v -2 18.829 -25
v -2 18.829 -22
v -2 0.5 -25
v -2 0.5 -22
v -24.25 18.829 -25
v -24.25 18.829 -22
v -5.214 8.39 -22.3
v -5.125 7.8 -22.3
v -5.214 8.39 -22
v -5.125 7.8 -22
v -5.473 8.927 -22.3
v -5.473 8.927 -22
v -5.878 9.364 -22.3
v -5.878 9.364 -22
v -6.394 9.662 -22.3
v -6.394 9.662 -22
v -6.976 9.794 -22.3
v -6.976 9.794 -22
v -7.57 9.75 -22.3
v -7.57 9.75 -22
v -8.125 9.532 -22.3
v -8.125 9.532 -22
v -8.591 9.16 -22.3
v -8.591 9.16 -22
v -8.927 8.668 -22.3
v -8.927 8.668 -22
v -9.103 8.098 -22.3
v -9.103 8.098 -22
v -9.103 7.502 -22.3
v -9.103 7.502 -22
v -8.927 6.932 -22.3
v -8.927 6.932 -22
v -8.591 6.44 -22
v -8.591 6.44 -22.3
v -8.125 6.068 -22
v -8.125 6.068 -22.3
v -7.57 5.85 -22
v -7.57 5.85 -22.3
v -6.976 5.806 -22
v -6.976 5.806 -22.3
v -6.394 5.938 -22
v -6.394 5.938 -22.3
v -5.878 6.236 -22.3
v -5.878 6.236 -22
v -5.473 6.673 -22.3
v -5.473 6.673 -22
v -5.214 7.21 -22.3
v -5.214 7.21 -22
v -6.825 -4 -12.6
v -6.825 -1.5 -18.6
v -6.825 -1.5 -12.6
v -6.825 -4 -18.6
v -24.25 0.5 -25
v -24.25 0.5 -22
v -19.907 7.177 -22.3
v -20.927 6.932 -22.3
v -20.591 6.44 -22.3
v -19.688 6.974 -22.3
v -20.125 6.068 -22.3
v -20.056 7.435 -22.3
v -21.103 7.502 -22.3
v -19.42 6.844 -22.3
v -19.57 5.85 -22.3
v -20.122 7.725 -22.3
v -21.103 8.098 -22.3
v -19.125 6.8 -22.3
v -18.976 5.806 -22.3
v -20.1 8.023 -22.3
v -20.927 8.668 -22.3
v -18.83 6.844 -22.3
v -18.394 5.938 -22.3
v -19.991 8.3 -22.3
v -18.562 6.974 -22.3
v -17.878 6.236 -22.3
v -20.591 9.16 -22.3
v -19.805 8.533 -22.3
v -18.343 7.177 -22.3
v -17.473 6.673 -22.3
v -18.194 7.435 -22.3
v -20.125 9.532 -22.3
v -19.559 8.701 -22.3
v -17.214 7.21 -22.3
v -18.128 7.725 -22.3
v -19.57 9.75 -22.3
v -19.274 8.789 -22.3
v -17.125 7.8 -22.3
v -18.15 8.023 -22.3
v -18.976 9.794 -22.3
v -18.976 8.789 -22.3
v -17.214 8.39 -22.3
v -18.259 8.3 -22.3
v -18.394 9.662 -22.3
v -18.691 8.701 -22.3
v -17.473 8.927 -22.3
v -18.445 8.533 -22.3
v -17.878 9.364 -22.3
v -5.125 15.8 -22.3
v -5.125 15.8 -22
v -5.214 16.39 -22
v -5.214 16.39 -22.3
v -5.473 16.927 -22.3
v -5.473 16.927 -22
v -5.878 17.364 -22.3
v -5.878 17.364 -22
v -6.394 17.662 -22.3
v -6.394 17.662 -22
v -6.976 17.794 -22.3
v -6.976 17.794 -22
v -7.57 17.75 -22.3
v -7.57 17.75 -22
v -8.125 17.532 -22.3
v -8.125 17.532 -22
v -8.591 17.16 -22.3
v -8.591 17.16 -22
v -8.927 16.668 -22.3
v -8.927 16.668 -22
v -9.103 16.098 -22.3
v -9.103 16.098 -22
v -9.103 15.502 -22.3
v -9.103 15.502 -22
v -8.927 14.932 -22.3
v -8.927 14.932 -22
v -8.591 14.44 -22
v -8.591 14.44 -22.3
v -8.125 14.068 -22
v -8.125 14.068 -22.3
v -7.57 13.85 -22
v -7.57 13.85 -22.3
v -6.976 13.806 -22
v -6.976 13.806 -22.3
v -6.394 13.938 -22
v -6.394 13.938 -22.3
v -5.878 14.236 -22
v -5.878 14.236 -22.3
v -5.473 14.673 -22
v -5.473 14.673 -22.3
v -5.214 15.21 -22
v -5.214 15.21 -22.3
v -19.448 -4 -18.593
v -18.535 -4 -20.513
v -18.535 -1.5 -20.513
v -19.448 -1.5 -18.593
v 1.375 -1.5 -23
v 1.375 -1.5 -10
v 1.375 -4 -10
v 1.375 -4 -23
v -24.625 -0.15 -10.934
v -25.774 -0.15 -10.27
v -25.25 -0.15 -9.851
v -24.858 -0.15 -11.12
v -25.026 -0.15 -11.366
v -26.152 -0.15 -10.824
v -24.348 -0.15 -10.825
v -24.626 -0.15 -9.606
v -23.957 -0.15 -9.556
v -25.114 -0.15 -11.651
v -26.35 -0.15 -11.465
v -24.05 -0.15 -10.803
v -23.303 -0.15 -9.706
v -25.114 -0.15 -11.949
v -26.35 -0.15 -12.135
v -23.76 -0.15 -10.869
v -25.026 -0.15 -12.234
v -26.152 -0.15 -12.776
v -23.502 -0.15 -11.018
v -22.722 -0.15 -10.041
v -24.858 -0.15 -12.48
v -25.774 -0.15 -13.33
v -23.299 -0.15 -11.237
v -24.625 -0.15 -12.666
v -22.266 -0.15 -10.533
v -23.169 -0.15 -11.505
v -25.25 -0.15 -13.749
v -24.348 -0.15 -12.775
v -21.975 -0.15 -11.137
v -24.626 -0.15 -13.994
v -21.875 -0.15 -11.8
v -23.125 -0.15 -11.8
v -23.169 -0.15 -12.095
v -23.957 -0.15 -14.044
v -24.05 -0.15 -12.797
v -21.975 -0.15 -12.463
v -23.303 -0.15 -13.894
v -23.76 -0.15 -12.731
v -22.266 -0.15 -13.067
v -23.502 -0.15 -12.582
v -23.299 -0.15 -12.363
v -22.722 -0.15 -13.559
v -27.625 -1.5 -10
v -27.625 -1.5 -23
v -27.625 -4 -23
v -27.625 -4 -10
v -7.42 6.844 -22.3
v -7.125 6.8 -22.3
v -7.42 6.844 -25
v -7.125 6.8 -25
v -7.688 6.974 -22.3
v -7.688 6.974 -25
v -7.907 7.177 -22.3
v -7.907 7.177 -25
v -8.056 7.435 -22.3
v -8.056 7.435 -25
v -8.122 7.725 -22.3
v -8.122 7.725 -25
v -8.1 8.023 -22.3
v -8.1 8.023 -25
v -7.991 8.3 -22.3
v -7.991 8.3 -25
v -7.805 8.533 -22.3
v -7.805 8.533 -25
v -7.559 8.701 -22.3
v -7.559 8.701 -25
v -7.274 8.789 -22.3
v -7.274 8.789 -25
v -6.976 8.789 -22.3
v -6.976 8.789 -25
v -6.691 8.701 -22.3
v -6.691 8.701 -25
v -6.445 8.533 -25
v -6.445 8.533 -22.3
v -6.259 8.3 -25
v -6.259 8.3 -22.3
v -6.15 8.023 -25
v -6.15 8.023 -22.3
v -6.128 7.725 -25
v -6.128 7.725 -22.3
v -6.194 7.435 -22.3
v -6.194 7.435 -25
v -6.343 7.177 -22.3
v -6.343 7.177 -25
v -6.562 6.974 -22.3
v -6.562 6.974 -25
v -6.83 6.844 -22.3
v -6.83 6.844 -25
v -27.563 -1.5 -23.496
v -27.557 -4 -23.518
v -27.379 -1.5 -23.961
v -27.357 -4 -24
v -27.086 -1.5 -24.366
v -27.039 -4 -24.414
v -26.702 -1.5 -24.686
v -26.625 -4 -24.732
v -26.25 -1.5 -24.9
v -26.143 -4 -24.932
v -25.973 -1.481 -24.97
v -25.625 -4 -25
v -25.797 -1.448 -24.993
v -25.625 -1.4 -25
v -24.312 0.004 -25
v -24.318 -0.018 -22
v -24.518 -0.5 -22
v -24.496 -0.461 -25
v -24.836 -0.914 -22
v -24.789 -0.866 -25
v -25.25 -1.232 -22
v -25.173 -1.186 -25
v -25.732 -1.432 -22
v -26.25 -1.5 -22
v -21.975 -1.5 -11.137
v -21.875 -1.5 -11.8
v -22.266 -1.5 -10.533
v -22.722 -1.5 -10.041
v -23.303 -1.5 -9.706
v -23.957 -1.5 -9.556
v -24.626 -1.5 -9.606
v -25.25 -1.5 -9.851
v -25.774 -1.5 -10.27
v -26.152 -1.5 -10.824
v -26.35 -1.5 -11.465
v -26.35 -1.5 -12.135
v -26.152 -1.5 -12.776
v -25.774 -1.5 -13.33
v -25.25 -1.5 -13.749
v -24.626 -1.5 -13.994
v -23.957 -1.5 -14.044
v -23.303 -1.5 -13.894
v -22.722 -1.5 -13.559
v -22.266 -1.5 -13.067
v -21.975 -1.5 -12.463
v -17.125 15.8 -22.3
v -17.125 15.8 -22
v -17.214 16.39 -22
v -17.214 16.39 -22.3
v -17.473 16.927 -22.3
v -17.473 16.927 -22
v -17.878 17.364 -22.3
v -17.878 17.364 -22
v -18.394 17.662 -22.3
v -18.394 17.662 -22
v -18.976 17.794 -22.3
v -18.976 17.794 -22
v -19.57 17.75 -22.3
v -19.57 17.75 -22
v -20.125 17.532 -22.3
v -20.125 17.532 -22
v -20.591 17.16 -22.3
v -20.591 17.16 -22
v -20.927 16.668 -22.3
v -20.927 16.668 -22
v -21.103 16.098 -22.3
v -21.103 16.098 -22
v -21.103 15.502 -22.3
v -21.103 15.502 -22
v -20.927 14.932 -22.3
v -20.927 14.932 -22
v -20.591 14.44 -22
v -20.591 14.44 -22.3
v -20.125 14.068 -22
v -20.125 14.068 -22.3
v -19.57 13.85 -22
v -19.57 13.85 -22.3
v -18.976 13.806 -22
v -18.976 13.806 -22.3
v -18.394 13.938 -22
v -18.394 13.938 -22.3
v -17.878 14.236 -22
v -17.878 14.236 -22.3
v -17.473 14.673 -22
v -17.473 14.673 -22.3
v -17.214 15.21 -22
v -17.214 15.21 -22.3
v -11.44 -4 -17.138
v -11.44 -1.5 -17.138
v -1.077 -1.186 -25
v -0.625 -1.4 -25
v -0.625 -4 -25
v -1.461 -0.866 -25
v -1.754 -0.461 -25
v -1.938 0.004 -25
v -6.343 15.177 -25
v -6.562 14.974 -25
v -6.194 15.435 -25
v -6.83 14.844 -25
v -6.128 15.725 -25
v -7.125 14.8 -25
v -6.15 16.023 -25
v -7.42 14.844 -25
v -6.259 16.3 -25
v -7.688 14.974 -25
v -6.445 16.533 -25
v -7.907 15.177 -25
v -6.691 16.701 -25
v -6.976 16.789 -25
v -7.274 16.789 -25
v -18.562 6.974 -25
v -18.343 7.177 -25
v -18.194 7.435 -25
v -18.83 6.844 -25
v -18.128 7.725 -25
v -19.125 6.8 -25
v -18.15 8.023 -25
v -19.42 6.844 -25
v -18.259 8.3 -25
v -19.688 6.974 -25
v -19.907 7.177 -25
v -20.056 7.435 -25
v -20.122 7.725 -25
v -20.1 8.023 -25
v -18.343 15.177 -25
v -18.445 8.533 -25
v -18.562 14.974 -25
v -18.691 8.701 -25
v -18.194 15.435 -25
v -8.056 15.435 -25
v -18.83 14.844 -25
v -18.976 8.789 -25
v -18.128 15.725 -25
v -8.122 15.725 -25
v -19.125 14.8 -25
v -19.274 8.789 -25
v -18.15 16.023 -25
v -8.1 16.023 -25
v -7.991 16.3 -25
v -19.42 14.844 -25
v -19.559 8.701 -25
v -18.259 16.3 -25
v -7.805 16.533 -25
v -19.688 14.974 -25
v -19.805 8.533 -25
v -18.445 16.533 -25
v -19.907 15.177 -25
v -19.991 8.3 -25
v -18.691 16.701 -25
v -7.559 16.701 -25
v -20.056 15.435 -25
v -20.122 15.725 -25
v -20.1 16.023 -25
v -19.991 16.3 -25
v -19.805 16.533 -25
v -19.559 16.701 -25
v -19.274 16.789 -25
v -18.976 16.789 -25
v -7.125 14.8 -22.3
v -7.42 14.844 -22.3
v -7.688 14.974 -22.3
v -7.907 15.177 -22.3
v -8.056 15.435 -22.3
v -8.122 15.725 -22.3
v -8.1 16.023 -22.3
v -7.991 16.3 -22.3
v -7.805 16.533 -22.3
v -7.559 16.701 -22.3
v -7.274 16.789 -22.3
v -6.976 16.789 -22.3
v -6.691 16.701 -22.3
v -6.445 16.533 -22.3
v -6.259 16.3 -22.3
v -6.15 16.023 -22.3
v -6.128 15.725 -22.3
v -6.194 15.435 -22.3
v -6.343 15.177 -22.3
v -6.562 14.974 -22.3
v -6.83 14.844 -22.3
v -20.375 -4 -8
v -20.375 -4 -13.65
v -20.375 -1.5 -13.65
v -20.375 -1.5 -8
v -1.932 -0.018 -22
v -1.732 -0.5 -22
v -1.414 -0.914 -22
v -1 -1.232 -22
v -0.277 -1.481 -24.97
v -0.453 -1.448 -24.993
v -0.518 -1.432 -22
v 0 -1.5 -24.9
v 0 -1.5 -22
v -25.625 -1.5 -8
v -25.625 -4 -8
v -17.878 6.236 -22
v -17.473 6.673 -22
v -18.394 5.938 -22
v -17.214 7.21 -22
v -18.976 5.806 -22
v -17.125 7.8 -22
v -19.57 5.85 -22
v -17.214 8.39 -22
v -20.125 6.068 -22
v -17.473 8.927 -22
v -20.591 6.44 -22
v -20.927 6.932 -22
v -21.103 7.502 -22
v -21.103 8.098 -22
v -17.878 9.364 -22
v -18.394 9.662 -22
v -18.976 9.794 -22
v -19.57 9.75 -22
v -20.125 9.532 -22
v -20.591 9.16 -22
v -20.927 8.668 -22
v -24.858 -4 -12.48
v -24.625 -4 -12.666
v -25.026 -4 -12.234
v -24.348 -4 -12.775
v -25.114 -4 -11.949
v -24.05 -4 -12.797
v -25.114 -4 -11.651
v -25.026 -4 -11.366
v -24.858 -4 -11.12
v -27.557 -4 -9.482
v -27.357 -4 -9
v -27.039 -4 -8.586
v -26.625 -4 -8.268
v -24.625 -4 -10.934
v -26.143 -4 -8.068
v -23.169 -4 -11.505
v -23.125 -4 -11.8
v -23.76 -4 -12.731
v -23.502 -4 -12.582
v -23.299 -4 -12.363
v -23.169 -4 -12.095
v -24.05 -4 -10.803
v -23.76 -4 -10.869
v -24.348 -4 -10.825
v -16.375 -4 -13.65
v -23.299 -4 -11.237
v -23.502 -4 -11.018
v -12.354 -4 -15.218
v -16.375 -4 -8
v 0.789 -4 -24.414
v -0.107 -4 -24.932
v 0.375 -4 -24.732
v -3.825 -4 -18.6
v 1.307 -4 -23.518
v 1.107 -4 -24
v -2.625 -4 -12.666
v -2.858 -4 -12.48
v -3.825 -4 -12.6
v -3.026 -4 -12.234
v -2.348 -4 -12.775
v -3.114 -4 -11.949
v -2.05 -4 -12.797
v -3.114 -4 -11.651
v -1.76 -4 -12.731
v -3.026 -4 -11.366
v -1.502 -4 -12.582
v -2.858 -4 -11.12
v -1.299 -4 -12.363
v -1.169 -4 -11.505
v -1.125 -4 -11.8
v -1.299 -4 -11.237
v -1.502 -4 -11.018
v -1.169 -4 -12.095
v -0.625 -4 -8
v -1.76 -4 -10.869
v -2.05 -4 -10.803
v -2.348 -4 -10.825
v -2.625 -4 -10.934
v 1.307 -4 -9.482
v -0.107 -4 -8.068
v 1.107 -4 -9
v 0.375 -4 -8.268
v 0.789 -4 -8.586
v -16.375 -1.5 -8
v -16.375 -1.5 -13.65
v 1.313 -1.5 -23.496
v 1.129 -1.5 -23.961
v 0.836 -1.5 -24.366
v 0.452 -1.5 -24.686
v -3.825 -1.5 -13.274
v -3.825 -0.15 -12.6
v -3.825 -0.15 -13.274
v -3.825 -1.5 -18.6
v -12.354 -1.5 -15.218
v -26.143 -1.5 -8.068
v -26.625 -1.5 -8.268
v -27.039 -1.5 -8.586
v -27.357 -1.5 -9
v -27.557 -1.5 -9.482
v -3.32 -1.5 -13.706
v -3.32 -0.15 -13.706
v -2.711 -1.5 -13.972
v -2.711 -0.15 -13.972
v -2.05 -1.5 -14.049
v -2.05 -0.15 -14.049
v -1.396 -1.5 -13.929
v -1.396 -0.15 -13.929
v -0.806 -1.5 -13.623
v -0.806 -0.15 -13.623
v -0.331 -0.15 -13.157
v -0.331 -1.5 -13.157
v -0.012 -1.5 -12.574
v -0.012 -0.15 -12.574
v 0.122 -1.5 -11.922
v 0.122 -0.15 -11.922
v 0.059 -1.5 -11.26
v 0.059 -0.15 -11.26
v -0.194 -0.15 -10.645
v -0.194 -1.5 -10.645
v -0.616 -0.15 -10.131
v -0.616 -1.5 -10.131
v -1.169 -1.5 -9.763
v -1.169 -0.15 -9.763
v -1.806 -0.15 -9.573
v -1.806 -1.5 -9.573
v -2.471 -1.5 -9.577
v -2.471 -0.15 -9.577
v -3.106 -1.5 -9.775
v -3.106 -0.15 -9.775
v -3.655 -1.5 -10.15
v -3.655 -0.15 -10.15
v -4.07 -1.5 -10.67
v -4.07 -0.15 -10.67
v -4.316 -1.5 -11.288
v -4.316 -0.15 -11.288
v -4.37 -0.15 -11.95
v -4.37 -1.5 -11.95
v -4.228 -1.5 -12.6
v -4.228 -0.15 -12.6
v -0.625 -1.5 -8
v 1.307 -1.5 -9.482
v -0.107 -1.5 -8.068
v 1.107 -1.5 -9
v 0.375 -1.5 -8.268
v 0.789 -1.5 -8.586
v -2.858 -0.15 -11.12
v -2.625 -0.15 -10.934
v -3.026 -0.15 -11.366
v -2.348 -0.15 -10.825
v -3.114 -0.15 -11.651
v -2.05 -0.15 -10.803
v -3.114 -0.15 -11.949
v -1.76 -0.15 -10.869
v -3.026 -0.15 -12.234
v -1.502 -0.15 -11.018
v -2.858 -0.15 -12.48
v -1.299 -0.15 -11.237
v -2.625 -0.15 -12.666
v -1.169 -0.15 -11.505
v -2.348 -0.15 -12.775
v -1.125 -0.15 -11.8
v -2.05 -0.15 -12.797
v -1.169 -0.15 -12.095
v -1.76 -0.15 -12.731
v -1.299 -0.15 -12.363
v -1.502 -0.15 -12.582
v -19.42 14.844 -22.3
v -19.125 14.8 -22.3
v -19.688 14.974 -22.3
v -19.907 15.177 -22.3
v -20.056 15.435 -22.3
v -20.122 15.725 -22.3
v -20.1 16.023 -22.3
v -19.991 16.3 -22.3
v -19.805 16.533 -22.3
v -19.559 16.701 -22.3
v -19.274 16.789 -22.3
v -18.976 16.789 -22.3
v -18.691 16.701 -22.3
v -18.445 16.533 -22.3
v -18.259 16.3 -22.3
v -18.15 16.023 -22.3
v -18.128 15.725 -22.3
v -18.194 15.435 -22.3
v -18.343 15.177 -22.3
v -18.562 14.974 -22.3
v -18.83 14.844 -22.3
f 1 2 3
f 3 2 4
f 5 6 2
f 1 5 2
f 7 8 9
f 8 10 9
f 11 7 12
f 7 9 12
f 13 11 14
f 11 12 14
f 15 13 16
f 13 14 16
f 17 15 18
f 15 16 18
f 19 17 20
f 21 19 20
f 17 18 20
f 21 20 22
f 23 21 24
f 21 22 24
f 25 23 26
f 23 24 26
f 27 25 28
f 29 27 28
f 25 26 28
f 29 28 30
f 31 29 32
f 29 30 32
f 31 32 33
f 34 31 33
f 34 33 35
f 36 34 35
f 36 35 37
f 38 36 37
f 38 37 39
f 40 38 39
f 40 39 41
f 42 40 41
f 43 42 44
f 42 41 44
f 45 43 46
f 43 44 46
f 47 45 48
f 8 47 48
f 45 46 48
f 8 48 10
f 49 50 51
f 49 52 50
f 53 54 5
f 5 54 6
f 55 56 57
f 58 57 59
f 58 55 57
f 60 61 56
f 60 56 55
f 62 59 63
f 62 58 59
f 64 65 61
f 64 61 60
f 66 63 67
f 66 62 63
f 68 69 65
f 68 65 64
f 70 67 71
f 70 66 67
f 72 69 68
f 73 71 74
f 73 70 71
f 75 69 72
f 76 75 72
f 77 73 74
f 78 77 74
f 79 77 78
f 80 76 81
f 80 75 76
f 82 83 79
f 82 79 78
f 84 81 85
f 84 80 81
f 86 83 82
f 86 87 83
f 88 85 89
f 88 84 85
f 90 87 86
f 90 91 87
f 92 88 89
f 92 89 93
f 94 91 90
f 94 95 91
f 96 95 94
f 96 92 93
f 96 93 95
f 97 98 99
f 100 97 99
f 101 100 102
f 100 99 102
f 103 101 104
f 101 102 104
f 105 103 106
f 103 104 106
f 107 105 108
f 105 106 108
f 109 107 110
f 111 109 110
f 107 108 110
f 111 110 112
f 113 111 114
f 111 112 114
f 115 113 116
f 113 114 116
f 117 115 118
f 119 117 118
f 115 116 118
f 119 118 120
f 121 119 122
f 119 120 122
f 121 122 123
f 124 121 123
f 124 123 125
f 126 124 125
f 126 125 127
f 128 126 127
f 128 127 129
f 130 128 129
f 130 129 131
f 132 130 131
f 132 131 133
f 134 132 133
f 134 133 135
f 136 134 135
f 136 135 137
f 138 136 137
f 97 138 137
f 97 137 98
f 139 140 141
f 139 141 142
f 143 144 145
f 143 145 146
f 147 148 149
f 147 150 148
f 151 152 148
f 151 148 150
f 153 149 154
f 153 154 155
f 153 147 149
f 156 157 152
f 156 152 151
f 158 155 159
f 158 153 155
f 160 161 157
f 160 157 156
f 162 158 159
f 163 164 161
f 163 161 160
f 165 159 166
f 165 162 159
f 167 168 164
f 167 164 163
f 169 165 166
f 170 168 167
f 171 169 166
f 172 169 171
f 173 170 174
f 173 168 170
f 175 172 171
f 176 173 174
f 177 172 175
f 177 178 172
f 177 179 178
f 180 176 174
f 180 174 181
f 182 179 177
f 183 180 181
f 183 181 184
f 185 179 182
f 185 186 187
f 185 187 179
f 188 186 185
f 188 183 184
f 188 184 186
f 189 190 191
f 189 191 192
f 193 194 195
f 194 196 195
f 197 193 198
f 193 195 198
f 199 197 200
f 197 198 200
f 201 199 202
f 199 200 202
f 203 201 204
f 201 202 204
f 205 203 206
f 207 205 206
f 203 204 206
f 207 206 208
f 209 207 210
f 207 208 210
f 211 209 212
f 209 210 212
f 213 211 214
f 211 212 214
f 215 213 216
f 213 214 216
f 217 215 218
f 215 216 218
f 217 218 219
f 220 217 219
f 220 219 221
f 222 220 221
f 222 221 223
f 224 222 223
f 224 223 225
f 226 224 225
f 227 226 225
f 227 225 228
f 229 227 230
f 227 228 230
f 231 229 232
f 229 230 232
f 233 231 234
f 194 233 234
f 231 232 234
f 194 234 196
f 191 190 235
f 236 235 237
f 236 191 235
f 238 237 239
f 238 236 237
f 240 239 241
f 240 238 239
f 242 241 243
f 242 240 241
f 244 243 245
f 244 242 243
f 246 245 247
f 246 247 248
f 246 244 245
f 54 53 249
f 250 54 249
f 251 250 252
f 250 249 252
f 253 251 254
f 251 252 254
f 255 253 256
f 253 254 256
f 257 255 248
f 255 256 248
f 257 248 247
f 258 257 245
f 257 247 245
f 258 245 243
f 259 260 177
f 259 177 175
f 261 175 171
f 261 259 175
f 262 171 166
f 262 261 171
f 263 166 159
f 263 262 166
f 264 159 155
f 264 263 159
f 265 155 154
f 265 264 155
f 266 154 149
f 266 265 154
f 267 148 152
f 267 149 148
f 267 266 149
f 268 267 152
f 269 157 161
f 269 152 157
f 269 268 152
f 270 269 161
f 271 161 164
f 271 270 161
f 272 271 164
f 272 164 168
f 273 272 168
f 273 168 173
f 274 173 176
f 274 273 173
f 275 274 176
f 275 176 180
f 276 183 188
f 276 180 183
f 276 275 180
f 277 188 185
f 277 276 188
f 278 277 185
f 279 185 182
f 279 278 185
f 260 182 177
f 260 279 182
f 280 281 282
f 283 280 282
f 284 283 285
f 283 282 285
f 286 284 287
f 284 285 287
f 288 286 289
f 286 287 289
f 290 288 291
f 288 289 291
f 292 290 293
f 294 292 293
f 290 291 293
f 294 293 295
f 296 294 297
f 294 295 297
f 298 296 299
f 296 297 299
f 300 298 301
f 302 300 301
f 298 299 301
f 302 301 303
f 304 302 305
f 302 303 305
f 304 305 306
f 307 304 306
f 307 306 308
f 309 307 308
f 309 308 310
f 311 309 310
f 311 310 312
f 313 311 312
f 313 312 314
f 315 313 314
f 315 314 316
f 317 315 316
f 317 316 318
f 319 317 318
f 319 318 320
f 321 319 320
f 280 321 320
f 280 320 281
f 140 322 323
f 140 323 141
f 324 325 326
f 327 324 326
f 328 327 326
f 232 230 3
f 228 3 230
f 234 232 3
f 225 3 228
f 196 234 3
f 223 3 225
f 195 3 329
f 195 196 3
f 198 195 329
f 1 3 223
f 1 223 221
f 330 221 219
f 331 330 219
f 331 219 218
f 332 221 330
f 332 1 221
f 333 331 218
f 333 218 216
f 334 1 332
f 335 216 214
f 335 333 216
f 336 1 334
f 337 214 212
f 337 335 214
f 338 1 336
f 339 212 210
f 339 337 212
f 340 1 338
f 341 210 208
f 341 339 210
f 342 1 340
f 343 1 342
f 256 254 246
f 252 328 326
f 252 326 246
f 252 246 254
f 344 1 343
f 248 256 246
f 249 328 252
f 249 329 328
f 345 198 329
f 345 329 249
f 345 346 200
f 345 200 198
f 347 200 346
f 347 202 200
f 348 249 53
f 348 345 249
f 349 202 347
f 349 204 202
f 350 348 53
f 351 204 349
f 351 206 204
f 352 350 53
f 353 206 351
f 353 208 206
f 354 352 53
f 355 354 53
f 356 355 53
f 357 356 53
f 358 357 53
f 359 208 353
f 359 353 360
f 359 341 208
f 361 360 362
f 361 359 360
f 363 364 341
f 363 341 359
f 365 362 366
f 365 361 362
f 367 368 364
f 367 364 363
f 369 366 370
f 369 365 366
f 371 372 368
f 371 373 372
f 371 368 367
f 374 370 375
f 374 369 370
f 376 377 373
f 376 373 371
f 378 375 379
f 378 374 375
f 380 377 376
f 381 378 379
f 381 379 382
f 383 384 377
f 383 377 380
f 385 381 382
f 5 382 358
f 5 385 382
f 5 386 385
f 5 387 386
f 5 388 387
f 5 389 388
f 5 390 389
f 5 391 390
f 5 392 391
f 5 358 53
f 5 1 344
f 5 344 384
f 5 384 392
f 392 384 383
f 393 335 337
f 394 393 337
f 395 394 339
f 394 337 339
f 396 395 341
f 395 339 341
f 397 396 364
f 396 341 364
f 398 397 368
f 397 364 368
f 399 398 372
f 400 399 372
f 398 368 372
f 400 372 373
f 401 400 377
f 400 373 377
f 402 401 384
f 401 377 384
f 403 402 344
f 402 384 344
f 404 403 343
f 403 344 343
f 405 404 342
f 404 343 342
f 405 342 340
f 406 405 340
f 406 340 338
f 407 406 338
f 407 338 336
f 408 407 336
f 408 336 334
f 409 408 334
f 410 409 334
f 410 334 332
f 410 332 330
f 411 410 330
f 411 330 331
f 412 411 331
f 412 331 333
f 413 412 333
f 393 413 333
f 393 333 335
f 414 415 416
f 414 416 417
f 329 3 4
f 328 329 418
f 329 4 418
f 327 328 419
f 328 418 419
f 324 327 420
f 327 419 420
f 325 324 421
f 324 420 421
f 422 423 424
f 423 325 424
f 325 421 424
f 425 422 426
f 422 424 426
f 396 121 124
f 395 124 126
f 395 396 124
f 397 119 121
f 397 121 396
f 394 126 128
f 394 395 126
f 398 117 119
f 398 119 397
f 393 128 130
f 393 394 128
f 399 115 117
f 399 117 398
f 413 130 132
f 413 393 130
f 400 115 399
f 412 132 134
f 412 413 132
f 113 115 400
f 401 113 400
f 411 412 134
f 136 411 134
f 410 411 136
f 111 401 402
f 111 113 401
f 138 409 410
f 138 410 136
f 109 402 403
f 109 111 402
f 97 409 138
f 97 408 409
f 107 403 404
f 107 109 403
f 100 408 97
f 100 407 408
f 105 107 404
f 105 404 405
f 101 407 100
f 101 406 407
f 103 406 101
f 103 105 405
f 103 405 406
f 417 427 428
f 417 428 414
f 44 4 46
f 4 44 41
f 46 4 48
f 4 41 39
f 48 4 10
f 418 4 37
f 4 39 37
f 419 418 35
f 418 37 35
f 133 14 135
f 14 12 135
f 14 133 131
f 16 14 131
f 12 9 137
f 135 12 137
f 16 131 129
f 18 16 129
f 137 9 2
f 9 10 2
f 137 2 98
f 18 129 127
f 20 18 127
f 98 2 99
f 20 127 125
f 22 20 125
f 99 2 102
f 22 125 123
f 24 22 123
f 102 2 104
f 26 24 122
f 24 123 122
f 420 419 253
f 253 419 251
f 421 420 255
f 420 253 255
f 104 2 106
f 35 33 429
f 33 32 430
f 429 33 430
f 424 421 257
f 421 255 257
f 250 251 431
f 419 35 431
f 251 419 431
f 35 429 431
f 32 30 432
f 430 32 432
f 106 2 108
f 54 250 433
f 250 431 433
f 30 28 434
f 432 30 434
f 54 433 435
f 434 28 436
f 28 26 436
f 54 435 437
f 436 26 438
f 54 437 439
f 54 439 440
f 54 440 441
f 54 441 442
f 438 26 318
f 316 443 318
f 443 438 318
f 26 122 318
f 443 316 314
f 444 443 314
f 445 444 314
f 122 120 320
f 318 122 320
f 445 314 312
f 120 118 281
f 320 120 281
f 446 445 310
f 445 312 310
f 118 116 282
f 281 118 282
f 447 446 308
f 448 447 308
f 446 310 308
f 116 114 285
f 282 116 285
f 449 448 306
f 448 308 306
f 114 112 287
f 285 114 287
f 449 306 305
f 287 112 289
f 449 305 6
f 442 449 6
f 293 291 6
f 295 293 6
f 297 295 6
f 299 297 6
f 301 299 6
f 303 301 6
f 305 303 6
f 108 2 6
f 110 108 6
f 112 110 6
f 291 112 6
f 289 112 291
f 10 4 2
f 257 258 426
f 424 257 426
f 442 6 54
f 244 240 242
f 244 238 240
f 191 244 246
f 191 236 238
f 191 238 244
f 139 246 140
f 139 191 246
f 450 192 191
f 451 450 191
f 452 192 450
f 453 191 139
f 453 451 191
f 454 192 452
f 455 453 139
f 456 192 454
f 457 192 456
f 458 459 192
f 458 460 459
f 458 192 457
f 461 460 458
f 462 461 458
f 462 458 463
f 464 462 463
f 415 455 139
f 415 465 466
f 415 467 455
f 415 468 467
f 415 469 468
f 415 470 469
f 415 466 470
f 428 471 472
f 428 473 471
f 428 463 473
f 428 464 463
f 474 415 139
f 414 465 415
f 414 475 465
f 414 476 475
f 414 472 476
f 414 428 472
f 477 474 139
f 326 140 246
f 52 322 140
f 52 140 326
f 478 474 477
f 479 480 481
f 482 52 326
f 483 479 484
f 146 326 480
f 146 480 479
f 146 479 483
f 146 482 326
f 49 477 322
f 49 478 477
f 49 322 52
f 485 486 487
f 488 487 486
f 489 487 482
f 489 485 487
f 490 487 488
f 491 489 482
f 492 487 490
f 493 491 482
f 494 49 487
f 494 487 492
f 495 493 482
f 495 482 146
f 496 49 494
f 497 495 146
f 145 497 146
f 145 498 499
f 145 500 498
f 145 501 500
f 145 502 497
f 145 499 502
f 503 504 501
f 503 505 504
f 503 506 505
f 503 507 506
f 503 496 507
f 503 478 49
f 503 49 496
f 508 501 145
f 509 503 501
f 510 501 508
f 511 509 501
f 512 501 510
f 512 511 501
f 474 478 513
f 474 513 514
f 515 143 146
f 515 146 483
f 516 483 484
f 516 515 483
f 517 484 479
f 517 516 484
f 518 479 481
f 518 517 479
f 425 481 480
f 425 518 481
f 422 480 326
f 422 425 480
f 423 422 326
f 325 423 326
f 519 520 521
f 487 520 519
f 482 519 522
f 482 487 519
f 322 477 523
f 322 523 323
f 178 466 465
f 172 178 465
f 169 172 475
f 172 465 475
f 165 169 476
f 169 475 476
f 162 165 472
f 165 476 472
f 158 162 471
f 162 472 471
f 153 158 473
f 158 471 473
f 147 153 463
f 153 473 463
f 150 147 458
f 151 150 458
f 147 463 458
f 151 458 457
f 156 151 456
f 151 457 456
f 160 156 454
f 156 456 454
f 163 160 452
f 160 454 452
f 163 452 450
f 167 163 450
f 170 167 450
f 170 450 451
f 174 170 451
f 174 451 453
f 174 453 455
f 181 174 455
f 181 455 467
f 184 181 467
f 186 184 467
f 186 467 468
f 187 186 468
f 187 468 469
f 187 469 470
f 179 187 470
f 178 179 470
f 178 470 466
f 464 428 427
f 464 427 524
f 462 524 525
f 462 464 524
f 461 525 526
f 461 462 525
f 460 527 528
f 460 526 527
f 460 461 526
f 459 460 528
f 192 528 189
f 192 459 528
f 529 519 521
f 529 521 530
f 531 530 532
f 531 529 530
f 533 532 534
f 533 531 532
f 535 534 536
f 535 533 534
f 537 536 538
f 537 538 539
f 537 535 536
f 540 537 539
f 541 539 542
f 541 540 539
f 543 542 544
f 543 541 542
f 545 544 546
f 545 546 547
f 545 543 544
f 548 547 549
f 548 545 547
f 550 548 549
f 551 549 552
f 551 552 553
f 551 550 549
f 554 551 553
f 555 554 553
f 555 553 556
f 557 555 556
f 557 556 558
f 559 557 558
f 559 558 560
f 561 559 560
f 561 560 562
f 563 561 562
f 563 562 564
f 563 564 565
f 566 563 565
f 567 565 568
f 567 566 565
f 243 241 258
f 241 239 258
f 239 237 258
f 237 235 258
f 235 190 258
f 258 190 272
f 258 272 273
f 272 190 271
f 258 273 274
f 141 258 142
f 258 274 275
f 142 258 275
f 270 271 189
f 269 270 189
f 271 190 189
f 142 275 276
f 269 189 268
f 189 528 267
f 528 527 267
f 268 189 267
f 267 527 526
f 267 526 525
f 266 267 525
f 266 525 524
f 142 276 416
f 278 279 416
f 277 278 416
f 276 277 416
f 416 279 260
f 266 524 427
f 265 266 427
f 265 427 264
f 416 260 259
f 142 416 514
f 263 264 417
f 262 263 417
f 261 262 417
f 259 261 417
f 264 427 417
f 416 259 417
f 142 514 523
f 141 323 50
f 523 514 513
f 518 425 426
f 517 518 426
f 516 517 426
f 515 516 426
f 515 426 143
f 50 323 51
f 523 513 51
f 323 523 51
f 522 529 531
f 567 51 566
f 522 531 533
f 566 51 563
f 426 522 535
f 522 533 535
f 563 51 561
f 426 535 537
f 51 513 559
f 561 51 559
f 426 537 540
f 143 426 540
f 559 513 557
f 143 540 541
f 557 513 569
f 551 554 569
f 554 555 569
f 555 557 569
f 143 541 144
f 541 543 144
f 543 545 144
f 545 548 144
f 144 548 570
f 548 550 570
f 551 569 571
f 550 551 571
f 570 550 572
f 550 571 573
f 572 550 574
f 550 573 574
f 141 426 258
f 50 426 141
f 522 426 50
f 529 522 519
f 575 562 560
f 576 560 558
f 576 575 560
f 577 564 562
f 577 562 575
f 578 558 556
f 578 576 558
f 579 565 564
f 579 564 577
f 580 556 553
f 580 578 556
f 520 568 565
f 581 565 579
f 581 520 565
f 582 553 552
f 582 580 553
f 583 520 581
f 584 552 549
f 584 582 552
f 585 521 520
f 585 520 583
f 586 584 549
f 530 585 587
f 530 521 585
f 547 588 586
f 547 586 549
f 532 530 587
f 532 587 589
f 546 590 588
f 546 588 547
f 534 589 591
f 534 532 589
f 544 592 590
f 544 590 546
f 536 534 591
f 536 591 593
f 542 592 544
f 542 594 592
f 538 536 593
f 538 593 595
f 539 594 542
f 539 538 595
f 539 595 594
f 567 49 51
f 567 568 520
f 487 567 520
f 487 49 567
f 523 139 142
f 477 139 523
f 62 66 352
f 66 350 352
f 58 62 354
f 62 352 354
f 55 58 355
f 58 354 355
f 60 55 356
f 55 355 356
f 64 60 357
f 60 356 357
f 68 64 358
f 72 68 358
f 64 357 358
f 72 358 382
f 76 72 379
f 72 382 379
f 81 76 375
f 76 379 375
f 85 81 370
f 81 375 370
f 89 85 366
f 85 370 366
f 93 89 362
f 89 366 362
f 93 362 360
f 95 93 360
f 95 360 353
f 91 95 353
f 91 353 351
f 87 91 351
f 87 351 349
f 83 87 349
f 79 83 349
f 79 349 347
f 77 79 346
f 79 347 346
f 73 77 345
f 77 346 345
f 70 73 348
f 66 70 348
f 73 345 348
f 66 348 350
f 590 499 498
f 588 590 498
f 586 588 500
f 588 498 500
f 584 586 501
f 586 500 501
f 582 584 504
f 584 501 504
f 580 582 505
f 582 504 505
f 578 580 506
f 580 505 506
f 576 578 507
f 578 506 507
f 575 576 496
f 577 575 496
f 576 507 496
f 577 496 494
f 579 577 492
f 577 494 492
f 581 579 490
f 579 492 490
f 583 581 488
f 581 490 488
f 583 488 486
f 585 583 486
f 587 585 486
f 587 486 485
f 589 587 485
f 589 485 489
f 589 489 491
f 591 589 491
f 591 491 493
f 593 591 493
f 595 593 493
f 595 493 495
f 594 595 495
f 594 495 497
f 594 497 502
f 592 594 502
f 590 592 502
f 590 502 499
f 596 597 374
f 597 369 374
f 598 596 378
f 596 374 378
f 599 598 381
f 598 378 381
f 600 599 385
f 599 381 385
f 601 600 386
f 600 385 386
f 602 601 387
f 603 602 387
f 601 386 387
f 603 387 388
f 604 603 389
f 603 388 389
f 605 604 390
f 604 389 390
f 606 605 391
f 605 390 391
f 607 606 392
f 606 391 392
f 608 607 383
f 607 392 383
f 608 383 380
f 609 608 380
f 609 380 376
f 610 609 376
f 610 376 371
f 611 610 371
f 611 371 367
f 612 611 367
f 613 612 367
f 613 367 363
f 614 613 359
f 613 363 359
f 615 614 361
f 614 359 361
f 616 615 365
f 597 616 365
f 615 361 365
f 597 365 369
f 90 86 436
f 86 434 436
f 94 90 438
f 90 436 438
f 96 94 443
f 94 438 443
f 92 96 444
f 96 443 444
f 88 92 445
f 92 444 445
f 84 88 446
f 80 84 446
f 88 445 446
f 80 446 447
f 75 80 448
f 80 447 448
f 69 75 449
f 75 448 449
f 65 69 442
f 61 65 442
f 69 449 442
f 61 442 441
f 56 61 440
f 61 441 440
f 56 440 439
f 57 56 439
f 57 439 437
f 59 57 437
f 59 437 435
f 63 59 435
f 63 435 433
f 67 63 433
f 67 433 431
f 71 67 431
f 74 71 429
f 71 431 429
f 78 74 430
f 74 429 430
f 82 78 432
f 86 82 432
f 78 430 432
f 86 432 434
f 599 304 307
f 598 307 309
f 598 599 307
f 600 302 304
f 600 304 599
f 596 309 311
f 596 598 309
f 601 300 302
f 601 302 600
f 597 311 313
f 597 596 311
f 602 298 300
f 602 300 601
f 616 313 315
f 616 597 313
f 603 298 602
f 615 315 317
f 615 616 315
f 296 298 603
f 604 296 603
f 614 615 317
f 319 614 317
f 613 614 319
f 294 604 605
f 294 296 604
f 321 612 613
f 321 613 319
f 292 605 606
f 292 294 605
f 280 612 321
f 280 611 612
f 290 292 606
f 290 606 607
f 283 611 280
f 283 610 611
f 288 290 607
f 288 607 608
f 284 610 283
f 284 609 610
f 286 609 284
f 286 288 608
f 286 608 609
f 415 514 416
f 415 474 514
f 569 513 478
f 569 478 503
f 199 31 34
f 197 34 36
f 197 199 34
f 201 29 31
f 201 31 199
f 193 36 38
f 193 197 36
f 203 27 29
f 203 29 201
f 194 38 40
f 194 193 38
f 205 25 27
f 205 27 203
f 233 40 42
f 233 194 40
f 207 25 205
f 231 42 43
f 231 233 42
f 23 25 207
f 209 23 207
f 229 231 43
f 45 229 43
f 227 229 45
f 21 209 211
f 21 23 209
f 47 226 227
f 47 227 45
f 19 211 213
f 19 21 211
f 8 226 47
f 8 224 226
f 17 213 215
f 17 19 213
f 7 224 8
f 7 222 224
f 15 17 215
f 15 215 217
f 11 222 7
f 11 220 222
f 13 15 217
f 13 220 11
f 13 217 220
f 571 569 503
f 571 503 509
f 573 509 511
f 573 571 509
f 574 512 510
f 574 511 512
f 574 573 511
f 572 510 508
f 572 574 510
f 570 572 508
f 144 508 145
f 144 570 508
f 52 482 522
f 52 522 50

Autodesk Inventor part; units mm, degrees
ref_plane "YZ Plane" through (0, 0, 0) normal (1, 0, 0) x (0, 1, 0)
ref_plane "XZ Plane" through (0, 0, 0) normal (0, 1, 0) x (-1, 0, 0)
ref_plane "XY Plane" through (0, 0, 0) normal (0, 0, 1) x (1, 0, 0)
sketch "Sketch1" plane through (0, 0, 0) normal (0, 1, 0) x (-1, 0, 0)
  line L0 (0, 0) -> (26.25, 0) construction
  line L1 (26.25, 0) -> (26.25, -22) construction
  line L2 (26.25, -22) -> (0, -22) construction
  line L3 (0, -22) -> (0, 0) construction
  circle A0 centre (2, -20) radius 1.95
  circle A1 centre (24.25, -2) radius 2
  dimension "d0" = 26.25
  dimension "d1" = 22
  dimension "d3" = 3.9
  dimension "d6" = 4
  dimension "d18" = 2
  dimension "d19" = 2
  dimension "d20" = 2
  dimension "d21" = 2
extrude "Extrusion1" add sketch "Sketch1" along normal blind 2.8
sketch "Sketch6" plane through (-24.25, 0, -2) normal (0, -1, 0) x (1, 0, 0)
  circle A0 centre (0, 0) radius 2 construction
  circle A1 centre (22.25, -18) radius 1.95 construction
  line L0 (-7.7702, -20) -> (30.063, -20) construction
  line L1 (1.9389, 3.3329) -> (25.6312, -15.8338)
  line L2 (25.6312, -15.8338) -> (25.6312, -20)
  circle A2 centre (22.25, -18) radius 1.95 projected
  line L3 (4, -20) -> (4, -16)
  line L4 (4, -16) -> (12.25, -16)
  line L5 (12.25, -16) -> (12.25, -20)
  line L6 (25.6312, -20) -> (12.25, -20)
  line L7 (4, -20) -> (-3.1908, -20)
  line L8 (2.5513, -5.9922) -> (9.3088, -11.459)
  line L9 (9.3088, -11.459) -> (2.5513, -11.459)
  line L10 (2.5513, -11.459) -> (2.5513, -5.9922)
  line L11 (-3.1908, -20) -> (-3.1908, 3.3329)
  line L12 (1.9389, 3.3329) -> (-3.1908, 3.3329)
  point P0 (24.25, 2)
  dimension "d28" = 2
  dimension "d31" = 10
  dimension "d32" = 4
  dimension "d40" = 4
extrude "Extrusion6" add sketch "Sketch6" along normal blind 2.5 contours L1 L2 L6 L5 L4 L3 L7 L11 L12 | A2
fillet "Fillet1" radius 2 1 edges at (-22.25, 0, -2)
hole "Hole1" at (-24.25, 2.8, -2) direction (0, -1, 0) diameter 2 depth 8 tip angle 118
hole "Hole2" at (-2, 2.8, -20) direction (0, -1, 0) diameter 2 depth 8 tip angle 118
fillet "Fillet2" radius 2 1 edges at (-0.05, 0, -20)
sketch "Sketch10" plane through (1.3812, -2.5, -22) normal (0, 0, -1) x (-1, 0, 0)
  line L0 (25.6312, -4.2658) -> (25.6312, 25.595) construction
  line L1 (3.3812, -4.2658) -> (3.3812, 25.595) construction
  line L2 (0, 0) -> (23.6922, 0) projected
  line L3 (3.3812, 0) -> (25.6312, 0)
  line L4 (25.6312, 0) -> (25.6312, 21.3292)
  line L5 (25.6312, 21.3292) -> (3.3812, 21.3292)
  line L6 (3.3812, 21.3292) -> (3.3812, 0)
  point P0 (1.3812, 2.5)
extrude "Extrusion8" add sketch "Sketch10" along normal blind 3
fillet "Fillet3" radius 2 1 edges at (-2, -0.4722, -22)
fillet "Fillet4" radius 2 1 edges at (-24.25, -1.25, -22)
fillet "Fillet5" radius 2 1 edges at (-22.25, 0, -22)
sketch "Sketch12" plane through (1.3812, -2.5, -22) normal (0, 0, 1) x (1, 0, 0)
  line L0 (-23.6312, 5.3) -> (-27.6312, 5.3) construction
  line L1 (-1.4312, 5.3) -> (-5.3312, 5.3) construction
  circle A0 centre (-20.5062, 18.3) radius 2
  circle A1 centre (-20.5062, 10.3) radius 2
  line L2 (-25.6312, 4.5) -> (-25.6312, 21.3292) projected
  line L3 (-3.3812, 21.3292) -> (-3.3812, 0) construction
  line L4 (-3.3812, 12.9146) -> (-25.6312, 12.9146) construction
  line L5 (-14.5062, 12.9146) -> (-14.5062, 6.5641) construction
  circle A2 centre (-8.5062, 18.3) radius 2
  circle A3 centre (-8.5062, 10.3) radius 2
  point P0 (-1.3812, 2.5)
  dimension "d67" = 4
  dimension "d70" = 5.125
  dimension "d72" = 5
  dimension "d73" = 5.125
  dimension "d112" = 12
  dimension "d113" = 8
extrude "Extrusion9" cut sketch "Sketch12" against normal blind 0.3
hole "Hole3" at (-19.125, 7.8, -22.3) direction (0, 0, -1) diameter 2 depth 8 tip angle 118
hole "Hole4" at (-19.125, 15.8, -22.3) direction (0, 0, -1) diameter 2 depth 8 tip angle 118
hole "Hole5" at (-7.125, 15.8, -22.3) direction (0, 0, -1) diameter 2 depth 8 tip angle 118
hole "Hole6" at (-7.125, 7.8, -22.3) direction (0, 0, -1) diameter 2 depth 8 tip angle 118
ref_plane "Work Plane3" through (-13.125, 7.8, -26.3) normal (-1, 0, 0) x (0, 0, 1)
ref_plane "Work Plane1" through (-7.125, 15.8, -26.3) normal (1, 0, 0) x (0, 0, 1)
ref_plane "Work Plane2" through (-19.125, 7.8, -26.3) normal (-1, 0, 0) x (0, 0, 1)
sketch "Sketch14" plane through (-24.25, 18.8292, -22) normal (0, 1, 0) x (1, 0, 0)
  line L0 (22.25, 0) -> (0, 0)
  line L1 (0, 0) -> (0, 3)
  line L2 (22.25, 3) -> (0, 3) projected
  line L3 (22.25, 3) -> (22.25, 0)
  arc A0 (0, 3) -> (22.25, 3) centre (11.125, -42.8915) ccw
  point P0 (24.25, -22)
extrude "Extrusion11" cut sketch "Sketch14" against normal through all contours L3 A0 L1 L0
sketch "Sketch15" plane through (-24.25, -2.5, -2) normal (0, -1, 0) x (1, 0, 0)
  line L0 (-3.375, -6) -> (25.625, -6)
  line L1 (25.625, -6) -> (25.625, -23)
  line L2 (25.625, -23) -> (-3.375, -23)
  line L3 (-3.375, -23) -> (-3.375, -6)
  line L4 (22.25, -20) -> (0, -20) construction
  line L5 (11.125, -28) -> (11.125, 7) construction
  line L6 (0, -20) -> (22.25, -20) construction
  line L7 (22.25, -23) -> (0, -23) projected
  point P0 (24.25, 2)
  point P1 (11.125, -23)
  point P2 (11.125, -20)
  point P3 (11.125, -20)
  point P4 (11.125, -23)
  point P5 (11.125, -23)
  dimension "d128" = 29
  dimension "d129" = 17
extrude "Extrusion12" add sketch "Sketch15" along normal blind 1.5 and the other way blind 1
sketch "Sketch19" plane through (-24.25, -1.5, -2) normal (0, 1, 0) x (1, 0, 0)
  circle A0 centre (22.125, 9.8) radius 2.25
  circle A1 centre (0.125, 9.8) radius 2.25
  line L0 (0.125, 9.8) -> (22.125, 9.8) construction
  line L1 (11.125, -7) -> (11.125, 28) construction
  line L2 (0, 20) -> (22.25, 20) construction
  line L3 (0, 20) -> (22.25, 20) construction
  line L4 (19.125, 20) -> (15.125, 20) construction
  line L5 (7.125, 20) -> (3.125, 20) construction
  line L6 (7.125, 20) -> (3.125, 20) construction
  line L7 (19.125, 20) -> (15.125, 20) construction
  point P0 (24.25, -2)
  point P1 (11.125, 9.8)
  dimension "d154" = 4.5
  dimension "d155" = 4.5
  dimension "d156" = 22
  dimension "d157" = 10.2
extrude "Extrusion16" add sketch "Sketch19" along normal blind 1.35
sketch "Sketch16" plane through (-24.25, -4, -2) normal (0, -1, 0) x (1, 0, 0)
  line L0 (15.125, -20) -> (19.125, -20) construction
  line L1 (3.125, -20) -> (7.125, -20) construction
  line L2 (3.125, -20) -> (7.125, -20) construction
  line L3 (15.125, -20) -> (19.125, -20) construction
  line L4 (0, -20) -> (22.25, -20) construction
  line L5 (0, -20) -> (22.25, -20) construction
  line L6 (0, -23) -> (0, -20) construction
  line L7 (22.25, -20) -> (22.25, -23) construction
  line L8 (11.125, -28) -> (11.125, 7) construction
  circle A0 centre (0.125, -9.8) radius 1
  circle A1 centre (22.125, -9.8) radius 1
  line L9 (0.125, -9.8) -> (22.125, -9.8) construction
  point P0 (24.25, 2)
  point P1 (11.125, -9.8)
  dimension "d132" = 2
  dimension "d133" = 2
  dimension "d134" = 22
  dimension "d135" = 10.2
extrude "Extrusion13" cut sketch "Sketch16" against normal through all
sketch "Sketch17" plane through (-24.25, -4, -2) normal (0, -1, 0) x (1, 0, 0)
  line L0 (15.125, -20) -> (19.125, -20) construction
  line L1 (3.125, -20) -> (7.125, -20) construction
  line L2 (3.125, -20) -> (7.125, -20) construction
  line L3 (15.125, -20) -> (19.125, -20) construction
  line L4 (0, -20) -> (22.25, -20) construction
  line L5 (0, -20) -> (22.25, -20) construction
  line L6 (22.25, -20) -> (22.25, -23) construction
  line L7 (22.25, -20) -> (22.25, -23) construction
  line L8 (0, -20) -> (0, -23) construction
  line L9 (0, -23) -> (0, -20) construction
  line L10 (3.875, -2.15) -> (7.875, -2.15)
  line L11 (7.875, -2.15) -> (7.875, -11.65)
  line L12 (7.875, -11.65) -> (3.875, -11.65)
  line L13 (3.875, -11.65) -> (3.875, -2.15)
  circle A0 centre (22.125, -9.8) radius 1 projected
  line L14 (17.425, -10.6) -> (20.425, -10.6)
  line L15 (20.425, -10.6) -> (20.425, -16.6)
  line L16 (20.425, -16.6) -> (17.425, -16.6)
  line L17 (17.425, -16.6) -> (17.425, -10.6)
  circle A1 centre (0.125, -9.8) radius 1 projected
  point P0 (24.25, 2)
  dimension "d138" = 9.5
  dimension "d139" = 4
  dimension "d142" = 6
  dimension "d143" = 3
  dimension "d161" = 3.75
  dimension "d162" = 1.7
  dimension "d163" = 3.4
  dimension "d164" = 8.35
extrude "Extrusion14" cut sketch "Sketch17" against normal through all contours L10 L11 L12 L13 | L14 L15 L16 L17
fillet "Fillet9" radius 2 4 edges at (1.375, -2.75, -25) (1.375, -2.75, -8) (-27.625, -2.75, -8) (-27.625, -2.75, -25)
fillet "Fillet10" radius 2 2 edges at (-2, -1.5, -23.5) (-24.25, -1.5, -23.5)
sketch "Sketch20" plane through (-24.25, -4, -2) normal (0, -1, 0) x (1, 0, 0)
  line L0 (24.25, -20) -> (-2, -20) construction
  line L1 (22.25, -20) -> (24.25, -20) construction
  line L2 (0, -20) -> (22.25, -20) construction
  line L3 (-2, -20) -> (0, -20) construction
  line L4 (15.125, -20) -> (19.125, -20) construction
  line L5 (3.125, -20) -> (7.125, -20) construction
  line L6 (3.125, -20) -> (7.125, -20) construction
  line L7 (15.125, -20) -> (19.125, -20) construction
  line L8 (0, -20) -> (0, -23) construction
  line L9 (0, -20) -> (0, -23) construction
  line L10 (22.25, -23) -> (22.25, -20) construction
  line L11 (22.25, -20) -> (22.25, -23) construction
  line L12 (4.8017, -16.5933) -> (11.8961, -13.2182)
  line L13 (11.8961, -13.2182) -> (12.8095, -15.138)
  line L14 (12.8095, -15.138) -> (5.7151, -18.5131)
  line L15 (5.7151, -18.5131) -> (4.8017, -16.5933)
  point P0 (24.25, 2)
extrude "Extrusion17" cut sketch "Sketch20" against normal through all
properties part number "camera_support_.Fatshark_600TVLipt" material "ABS Plastic"
